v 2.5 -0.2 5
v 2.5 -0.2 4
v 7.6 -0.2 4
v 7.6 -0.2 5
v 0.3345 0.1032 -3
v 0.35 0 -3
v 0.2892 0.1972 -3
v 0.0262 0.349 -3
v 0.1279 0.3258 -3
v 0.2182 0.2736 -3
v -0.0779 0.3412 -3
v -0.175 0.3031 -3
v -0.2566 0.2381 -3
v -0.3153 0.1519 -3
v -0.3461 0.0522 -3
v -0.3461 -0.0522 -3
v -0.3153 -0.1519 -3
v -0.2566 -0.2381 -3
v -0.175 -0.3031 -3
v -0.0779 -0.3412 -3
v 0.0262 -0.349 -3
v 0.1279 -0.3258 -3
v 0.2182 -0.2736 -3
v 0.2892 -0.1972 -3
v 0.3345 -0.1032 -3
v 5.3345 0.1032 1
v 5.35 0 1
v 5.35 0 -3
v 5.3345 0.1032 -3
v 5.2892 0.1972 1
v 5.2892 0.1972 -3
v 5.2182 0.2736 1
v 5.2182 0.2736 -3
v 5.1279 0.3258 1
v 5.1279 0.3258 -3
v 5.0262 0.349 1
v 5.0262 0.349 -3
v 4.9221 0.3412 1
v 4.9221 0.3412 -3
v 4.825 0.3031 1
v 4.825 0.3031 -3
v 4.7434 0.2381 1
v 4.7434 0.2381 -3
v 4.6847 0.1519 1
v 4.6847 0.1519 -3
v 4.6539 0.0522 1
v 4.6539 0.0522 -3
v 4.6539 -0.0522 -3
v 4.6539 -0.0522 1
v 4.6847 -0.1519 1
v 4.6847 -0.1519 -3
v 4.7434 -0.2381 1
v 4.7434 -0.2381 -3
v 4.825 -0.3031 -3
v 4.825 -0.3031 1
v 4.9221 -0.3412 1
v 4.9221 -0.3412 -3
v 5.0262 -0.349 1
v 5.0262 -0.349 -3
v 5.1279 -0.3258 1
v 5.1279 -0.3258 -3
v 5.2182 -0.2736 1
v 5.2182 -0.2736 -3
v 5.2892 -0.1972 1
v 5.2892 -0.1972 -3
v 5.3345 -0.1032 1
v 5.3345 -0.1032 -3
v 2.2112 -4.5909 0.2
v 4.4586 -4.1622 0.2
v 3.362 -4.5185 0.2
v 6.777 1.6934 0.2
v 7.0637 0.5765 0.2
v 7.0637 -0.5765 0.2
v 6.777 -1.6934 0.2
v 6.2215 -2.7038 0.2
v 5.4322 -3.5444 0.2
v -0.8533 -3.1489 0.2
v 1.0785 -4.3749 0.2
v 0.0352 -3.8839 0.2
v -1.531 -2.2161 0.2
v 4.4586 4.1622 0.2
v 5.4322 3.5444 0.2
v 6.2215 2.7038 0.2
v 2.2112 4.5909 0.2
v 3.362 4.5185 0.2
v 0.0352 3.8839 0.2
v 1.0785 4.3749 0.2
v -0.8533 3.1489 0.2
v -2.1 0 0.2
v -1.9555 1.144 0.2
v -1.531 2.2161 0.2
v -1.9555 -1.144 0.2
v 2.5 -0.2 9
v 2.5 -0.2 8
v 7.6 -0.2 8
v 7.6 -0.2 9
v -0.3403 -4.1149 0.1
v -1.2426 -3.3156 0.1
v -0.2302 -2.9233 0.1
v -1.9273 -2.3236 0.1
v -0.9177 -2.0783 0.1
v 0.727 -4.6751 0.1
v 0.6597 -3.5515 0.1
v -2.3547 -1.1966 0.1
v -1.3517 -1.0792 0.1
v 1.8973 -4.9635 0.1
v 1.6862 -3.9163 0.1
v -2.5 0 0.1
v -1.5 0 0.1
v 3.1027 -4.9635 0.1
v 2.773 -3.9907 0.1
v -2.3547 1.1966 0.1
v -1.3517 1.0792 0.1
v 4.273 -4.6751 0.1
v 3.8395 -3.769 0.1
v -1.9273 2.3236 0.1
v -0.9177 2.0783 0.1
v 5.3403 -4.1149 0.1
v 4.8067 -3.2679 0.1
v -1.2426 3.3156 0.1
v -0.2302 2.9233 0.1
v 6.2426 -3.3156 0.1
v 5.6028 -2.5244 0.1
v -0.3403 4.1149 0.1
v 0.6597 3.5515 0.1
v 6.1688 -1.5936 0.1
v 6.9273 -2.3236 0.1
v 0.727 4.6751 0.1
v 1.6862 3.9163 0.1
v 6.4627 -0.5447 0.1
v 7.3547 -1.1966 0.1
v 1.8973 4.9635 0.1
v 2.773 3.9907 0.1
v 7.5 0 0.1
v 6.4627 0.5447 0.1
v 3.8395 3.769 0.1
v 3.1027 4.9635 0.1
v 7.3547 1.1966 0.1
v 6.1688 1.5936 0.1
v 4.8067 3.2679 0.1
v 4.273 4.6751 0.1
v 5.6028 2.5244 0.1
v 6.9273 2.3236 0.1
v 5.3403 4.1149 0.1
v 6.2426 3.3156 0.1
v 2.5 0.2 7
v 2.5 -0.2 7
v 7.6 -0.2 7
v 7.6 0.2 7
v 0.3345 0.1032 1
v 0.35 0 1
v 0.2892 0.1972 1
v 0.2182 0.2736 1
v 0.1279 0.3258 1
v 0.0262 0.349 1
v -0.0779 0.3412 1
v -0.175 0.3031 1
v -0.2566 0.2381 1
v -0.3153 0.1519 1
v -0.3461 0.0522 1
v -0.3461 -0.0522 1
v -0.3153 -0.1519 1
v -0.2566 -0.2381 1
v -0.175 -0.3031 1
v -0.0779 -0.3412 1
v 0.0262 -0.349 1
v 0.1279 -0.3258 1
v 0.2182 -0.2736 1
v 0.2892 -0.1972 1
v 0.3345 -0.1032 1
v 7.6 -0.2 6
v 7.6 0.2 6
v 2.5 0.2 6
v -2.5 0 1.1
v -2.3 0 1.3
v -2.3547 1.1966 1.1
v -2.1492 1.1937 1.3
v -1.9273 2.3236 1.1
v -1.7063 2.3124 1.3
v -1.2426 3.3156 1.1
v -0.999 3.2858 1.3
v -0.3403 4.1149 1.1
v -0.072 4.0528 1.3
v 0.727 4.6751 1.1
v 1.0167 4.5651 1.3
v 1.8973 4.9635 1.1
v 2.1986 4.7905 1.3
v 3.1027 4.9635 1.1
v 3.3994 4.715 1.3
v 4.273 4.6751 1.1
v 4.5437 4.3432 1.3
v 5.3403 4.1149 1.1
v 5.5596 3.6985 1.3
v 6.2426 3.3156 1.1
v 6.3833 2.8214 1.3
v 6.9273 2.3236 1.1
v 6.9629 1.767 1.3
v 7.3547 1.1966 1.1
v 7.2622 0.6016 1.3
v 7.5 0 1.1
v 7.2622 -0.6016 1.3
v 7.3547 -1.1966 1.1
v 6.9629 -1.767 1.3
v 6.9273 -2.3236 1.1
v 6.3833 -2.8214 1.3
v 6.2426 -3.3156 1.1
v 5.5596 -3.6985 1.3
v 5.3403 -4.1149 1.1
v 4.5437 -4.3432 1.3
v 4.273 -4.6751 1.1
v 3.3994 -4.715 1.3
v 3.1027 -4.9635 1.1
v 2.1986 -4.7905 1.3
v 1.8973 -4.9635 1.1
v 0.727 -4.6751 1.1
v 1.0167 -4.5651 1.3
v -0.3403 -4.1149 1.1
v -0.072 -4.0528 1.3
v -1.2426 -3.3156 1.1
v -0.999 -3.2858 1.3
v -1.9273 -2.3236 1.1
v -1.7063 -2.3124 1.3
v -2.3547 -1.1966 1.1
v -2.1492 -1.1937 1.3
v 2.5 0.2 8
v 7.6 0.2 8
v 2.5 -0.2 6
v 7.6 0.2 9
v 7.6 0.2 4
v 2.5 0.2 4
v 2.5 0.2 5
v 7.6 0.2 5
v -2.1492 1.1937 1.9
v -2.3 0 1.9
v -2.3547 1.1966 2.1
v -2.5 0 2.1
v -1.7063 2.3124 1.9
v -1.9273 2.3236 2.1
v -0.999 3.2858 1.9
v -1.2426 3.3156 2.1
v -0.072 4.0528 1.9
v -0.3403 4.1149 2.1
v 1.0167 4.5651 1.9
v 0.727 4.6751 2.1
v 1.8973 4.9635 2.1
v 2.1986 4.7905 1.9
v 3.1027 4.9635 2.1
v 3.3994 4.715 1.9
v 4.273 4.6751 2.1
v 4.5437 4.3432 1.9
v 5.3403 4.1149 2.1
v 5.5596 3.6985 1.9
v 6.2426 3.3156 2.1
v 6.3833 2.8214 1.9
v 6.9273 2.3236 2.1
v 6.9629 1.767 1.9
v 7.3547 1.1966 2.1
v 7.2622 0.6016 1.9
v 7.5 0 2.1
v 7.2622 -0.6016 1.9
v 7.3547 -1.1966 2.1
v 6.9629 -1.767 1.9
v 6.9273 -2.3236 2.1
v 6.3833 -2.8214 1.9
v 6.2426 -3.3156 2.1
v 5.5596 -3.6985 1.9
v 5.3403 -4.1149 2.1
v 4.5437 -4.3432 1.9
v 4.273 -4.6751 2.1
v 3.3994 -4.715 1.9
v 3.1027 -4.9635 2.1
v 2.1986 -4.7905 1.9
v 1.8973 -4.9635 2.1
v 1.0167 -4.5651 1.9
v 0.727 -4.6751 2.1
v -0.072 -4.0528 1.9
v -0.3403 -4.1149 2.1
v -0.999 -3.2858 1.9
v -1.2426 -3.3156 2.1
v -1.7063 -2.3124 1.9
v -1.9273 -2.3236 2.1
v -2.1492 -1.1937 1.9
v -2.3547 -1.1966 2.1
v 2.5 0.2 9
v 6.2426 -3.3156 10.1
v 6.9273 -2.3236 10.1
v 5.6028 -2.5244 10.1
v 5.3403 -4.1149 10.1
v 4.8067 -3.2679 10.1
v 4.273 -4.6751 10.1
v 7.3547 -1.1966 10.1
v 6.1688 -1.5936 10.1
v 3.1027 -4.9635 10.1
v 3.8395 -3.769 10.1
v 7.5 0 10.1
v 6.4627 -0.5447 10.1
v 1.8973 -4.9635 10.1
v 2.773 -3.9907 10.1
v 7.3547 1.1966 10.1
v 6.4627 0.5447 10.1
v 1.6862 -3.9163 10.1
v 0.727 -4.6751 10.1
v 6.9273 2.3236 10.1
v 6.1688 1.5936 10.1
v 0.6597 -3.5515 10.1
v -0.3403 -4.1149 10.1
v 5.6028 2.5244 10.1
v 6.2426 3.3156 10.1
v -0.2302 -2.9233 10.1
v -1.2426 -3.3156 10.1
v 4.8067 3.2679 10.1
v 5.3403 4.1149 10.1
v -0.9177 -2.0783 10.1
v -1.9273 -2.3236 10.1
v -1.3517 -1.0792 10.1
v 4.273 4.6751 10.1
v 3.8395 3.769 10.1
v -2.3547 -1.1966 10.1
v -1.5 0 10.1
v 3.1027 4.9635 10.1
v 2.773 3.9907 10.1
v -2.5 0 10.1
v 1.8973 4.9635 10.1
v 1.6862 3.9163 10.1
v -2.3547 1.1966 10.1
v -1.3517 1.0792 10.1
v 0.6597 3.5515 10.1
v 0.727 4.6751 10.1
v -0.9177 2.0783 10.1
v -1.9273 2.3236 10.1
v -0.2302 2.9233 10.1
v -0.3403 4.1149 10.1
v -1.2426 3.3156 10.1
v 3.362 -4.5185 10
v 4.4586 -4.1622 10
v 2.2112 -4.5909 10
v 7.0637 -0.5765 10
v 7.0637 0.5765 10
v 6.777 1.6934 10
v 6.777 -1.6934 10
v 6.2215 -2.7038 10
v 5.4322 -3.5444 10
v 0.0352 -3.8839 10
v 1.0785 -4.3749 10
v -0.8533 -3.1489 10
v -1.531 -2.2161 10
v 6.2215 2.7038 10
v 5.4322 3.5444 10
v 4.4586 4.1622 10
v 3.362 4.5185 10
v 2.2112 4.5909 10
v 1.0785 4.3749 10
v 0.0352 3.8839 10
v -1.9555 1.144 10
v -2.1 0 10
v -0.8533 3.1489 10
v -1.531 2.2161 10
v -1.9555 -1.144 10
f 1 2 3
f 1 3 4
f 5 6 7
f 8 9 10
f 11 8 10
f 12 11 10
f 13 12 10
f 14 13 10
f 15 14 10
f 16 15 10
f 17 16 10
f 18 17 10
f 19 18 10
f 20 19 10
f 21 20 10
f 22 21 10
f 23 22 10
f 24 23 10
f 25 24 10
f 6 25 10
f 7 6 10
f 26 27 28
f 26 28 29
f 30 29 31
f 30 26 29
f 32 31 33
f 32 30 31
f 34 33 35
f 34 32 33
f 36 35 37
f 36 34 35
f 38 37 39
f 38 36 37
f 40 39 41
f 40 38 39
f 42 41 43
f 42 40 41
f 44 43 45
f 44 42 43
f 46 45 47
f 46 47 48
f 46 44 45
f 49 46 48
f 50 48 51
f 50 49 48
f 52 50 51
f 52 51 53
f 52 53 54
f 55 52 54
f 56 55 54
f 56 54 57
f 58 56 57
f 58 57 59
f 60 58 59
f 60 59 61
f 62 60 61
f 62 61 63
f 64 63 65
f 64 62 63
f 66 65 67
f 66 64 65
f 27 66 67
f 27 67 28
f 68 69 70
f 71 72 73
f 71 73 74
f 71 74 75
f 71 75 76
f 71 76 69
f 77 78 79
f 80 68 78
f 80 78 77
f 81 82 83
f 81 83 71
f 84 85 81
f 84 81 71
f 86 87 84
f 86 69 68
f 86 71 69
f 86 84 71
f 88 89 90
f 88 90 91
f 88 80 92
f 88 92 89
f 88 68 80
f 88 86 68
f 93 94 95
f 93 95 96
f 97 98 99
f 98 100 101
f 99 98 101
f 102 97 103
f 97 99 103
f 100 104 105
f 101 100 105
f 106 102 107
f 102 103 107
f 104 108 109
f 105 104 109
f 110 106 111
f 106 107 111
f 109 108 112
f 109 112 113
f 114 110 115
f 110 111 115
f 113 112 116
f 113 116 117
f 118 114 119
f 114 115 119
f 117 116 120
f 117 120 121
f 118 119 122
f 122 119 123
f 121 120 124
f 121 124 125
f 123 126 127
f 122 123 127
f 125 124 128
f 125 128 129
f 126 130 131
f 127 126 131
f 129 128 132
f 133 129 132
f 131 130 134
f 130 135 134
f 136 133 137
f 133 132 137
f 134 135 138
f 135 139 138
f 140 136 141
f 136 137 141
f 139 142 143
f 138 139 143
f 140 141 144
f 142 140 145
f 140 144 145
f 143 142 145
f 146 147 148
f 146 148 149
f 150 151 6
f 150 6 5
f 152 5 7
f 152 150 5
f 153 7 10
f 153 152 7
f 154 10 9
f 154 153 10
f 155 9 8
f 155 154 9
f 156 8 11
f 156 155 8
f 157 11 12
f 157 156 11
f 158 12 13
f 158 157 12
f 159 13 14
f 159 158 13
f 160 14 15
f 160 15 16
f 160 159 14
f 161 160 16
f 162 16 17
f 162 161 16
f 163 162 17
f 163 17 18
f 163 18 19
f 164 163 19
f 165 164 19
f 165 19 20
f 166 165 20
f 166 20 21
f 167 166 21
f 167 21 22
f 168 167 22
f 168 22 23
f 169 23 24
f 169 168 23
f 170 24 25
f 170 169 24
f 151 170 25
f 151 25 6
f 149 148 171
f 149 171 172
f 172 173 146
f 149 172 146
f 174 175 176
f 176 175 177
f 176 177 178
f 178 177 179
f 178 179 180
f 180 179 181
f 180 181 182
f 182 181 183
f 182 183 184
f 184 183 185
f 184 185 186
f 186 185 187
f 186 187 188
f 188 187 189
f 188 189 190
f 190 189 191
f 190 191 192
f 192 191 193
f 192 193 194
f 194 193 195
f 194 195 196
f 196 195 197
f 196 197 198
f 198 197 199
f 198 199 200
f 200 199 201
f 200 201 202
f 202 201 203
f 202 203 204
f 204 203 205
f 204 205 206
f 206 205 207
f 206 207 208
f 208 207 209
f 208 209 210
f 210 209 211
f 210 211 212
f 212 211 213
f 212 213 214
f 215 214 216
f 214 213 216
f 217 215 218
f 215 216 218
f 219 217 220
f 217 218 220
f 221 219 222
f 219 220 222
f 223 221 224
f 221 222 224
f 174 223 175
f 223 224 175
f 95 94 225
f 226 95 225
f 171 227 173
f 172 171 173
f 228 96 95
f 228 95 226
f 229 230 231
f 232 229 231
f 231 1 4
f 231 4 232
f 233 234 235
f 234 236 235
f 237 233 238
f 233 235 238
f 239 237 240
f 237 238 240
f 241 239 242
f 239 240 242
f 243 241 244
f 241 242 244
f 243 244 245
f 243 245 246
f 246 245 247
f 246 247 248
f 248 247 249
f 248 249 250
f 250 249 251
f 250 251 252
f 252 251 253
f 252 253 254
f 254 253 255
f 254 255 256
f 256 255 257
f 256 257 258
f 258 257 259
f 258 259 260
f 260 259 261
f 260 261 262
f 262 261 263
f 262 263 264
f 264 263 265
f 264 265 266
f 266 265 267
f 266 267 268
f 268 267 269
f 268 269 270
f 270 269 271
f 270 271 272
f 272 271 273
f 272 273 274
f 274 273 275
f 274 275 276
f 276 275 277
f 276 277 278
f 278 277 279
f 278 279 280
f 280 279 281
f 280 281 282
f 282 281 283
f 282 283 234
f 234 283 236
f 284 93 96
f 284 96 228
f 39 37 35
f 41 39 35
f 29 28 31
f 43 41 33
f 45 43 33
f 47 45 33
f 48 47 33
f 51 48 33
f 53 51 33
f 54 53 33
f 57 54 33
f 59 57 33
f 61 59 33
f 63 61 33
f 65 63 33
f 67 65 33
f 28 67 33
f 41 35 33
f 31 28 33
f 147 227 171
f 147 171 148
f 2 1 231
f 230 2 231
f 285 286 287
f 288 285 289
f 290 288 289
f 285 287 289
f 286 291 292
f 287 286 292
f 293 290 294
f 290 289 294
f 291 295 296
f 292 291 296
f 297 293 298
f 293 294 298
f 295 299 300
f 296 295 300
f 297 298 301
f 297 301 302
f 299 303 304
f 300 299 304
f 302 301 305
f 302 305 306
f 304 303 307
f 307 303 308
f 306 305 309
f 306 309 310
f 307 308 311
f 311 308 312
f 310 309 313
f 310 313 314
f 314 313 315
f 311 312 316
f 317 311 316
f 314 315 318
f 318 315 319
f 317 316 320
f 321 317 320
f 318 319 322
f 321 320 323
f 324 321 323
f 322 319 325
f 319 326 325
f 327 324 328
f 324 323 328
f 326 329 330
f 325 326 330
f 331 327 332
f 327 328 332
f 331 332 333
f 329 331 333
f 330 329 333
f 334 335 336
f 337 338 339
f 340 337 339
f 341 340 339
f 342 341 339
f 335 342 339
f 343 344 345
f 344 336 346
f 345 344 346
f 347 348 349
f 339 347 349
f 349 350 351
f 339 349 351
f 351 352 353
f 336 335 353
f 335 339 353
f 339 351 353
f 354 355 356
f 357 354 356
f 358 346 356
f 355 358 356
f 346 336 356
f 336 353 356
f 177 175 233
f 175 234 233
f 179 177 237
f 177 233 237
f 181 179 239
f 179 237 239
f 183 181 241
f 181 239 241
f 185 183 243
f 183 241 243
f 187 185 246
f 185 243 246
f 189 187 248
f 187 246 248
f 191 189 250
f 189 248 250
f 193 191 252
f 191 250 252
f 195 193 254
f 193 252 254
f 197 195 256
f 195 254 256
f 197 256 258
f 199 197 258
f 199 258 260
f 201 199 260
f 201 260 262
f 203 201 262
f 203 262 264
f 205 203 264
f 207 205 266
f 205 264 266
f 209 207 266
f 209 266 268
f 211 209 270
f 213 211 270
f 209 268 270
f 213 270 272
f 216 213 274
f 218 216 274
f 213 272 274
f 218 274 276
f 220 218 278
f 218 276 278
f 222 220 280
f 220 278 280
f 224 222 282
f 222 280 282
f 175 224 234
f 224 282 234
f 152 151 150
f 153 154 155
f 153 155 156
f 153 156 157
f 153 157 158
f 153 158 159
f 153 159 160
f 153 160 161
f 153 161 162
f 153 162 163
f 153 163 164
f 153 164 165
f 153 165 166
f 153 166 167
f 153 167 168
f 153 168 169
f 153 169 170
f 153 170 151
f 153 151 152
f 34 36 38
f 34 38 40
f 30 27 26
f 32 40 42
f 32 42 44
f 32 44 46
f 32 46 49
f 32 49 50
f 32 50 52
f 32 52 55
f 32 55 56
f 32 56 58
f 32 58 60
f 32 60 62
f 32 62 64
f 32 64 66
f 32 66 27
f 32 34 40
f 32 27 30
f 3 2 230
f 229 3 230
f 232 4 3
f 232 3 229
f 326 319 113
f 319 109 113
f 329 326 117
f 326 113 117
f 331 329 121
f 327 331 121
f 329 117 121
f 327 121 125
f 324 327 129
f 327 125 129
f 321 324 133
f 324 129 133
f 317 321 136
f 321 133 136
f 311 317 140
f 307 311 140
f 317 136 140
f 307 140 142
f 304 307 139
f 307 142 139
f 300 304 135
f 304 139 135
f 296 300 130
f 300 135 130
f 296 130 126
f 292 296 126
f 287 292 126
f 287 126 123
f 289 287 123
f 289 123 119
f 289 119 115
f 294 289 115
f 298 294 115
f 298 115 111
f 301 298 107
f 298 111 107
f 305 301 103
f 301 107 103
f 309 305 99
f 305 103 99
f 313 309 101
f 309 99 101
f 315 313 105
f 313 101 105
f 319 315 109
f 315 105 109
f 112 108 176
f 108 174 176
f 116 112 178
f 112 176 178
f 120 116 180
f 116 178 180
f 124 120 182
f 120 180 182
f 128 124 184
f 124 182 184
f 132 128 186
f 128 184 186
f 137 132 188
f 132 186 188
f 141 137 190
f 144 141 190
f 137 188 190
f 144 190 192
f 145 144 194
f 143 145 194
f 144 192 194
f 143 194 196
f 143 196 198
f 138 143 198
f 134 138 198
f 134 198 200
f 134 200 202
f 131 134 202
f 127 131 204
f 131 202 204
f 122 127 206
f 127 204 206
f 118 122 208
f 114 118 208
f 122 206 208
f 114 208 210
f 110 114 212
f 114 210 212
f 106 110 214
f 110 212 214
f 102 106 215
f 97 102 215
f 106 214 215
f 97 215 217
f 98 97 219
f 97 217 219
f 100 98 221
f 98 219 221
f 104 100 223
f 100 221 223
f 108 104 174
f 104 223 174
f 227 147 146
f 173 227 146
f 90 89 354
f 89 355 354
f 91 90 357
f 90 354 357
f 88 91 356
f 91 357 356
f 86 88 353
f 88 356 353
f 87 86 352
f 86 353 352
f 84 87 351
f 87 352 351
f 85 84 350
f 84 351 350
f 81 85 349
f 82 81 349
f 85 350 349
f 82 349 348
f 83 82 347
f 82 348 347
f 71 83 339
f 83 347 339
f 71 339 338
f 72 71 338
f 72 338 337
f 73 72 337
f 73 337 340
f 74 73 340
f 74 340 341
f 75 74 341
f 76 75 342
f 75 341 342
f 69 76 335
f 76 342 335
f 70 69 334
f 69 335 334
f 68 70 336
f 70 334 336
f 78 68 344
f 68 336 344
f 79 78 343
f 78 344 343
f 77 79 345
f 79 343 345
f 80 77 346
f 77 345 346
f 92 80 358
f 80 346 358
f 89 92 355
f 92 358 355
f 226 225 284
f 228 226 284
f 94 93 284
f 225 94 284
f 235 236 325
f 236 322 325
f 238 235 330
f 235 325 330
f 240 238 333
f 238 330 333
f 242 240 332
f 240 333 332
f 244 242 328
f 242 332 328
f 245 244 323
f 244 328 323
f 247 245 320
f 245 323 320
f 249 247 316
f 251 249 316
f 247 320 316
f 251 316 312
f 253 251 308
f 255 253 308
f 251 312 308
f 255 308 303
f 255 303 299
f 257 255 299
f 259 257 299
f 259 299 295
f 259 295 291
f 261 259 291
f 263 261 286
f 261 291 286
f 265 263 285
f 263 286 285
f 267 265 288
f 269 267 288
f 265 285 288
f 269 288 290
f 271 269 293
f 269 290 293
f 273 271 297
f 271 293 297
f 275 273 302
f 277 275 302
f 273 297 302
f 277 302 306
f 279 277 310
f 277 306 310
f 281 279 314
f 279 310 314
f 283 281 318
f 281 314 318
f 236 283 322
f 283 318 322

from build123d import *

# Parameters (mm, degrees)
SKETCH002_W  = 4.6
SKETCH002_H  = 9.8
SKETCH003_R  = 0.35
PAD_DEPTH    = 4
SKETCH004_W  = 0.4
SKETCH004_H  = 1
PAD001_DEPTH = 5.1


with BuildPart() as revolution:
    # Sketch → Revolution (revolve)
    with BuildSketch(Plane.XZ):
        Polygon((-2.5, 0.1), (-2.5, 1.1), (-2.3, 1.3), (-2.3, 1.9), (-2.5, 2.1), (-2.5, 10.1), (-1.5, 10.1), (-1.5, 0.1), align=None)
    revolve(axis=Axis((2.5, 0, 7.548619), (0, 0, -1)))


with BuildPart() as revolution001:
    # Sketch002 → Revolution001 (revolve)
    with BuildSketch(Plane.XZ):
        with Locations((0.2, 5.1)):
            Rectangle(SKETCH002_W, SKETCH002_H)
    revolve(axis=Axis((2.5, 0, 4.680116), (0, 0, -1)))


with BuildPart() as pad:
    # Sketch003 → Pad (new body)
    with BuildSketch(Plane.XY.offset(1)):
        Circle(SKETCH003_R)
        with Locations((5, 0)):
            Circle(SKETCH003_R)
    extrude(amount=-PAD_DEPTH)


with BuildPart() as pad001:
    # Sketch004 → Pad001 (new body)
    with BuildSketch(Plane.YZ.offset(2.5)):
        with Locations((0, 4.5)):
            Rectangle(SKETCH004_W, SKETCH004_H)
        with Locations((0, 6.5)):
            Rectangle(SKETCH004_W, SKETCH004_H)
        with Locations((0, 8.5)):
            Rectangle(SKETCH004_W, SKETCH004_H)
    extrude(amount=PAD001_DEPTH)


solid = Compound([revolution.part, revolution001.part, pad.part, pad001.part])
